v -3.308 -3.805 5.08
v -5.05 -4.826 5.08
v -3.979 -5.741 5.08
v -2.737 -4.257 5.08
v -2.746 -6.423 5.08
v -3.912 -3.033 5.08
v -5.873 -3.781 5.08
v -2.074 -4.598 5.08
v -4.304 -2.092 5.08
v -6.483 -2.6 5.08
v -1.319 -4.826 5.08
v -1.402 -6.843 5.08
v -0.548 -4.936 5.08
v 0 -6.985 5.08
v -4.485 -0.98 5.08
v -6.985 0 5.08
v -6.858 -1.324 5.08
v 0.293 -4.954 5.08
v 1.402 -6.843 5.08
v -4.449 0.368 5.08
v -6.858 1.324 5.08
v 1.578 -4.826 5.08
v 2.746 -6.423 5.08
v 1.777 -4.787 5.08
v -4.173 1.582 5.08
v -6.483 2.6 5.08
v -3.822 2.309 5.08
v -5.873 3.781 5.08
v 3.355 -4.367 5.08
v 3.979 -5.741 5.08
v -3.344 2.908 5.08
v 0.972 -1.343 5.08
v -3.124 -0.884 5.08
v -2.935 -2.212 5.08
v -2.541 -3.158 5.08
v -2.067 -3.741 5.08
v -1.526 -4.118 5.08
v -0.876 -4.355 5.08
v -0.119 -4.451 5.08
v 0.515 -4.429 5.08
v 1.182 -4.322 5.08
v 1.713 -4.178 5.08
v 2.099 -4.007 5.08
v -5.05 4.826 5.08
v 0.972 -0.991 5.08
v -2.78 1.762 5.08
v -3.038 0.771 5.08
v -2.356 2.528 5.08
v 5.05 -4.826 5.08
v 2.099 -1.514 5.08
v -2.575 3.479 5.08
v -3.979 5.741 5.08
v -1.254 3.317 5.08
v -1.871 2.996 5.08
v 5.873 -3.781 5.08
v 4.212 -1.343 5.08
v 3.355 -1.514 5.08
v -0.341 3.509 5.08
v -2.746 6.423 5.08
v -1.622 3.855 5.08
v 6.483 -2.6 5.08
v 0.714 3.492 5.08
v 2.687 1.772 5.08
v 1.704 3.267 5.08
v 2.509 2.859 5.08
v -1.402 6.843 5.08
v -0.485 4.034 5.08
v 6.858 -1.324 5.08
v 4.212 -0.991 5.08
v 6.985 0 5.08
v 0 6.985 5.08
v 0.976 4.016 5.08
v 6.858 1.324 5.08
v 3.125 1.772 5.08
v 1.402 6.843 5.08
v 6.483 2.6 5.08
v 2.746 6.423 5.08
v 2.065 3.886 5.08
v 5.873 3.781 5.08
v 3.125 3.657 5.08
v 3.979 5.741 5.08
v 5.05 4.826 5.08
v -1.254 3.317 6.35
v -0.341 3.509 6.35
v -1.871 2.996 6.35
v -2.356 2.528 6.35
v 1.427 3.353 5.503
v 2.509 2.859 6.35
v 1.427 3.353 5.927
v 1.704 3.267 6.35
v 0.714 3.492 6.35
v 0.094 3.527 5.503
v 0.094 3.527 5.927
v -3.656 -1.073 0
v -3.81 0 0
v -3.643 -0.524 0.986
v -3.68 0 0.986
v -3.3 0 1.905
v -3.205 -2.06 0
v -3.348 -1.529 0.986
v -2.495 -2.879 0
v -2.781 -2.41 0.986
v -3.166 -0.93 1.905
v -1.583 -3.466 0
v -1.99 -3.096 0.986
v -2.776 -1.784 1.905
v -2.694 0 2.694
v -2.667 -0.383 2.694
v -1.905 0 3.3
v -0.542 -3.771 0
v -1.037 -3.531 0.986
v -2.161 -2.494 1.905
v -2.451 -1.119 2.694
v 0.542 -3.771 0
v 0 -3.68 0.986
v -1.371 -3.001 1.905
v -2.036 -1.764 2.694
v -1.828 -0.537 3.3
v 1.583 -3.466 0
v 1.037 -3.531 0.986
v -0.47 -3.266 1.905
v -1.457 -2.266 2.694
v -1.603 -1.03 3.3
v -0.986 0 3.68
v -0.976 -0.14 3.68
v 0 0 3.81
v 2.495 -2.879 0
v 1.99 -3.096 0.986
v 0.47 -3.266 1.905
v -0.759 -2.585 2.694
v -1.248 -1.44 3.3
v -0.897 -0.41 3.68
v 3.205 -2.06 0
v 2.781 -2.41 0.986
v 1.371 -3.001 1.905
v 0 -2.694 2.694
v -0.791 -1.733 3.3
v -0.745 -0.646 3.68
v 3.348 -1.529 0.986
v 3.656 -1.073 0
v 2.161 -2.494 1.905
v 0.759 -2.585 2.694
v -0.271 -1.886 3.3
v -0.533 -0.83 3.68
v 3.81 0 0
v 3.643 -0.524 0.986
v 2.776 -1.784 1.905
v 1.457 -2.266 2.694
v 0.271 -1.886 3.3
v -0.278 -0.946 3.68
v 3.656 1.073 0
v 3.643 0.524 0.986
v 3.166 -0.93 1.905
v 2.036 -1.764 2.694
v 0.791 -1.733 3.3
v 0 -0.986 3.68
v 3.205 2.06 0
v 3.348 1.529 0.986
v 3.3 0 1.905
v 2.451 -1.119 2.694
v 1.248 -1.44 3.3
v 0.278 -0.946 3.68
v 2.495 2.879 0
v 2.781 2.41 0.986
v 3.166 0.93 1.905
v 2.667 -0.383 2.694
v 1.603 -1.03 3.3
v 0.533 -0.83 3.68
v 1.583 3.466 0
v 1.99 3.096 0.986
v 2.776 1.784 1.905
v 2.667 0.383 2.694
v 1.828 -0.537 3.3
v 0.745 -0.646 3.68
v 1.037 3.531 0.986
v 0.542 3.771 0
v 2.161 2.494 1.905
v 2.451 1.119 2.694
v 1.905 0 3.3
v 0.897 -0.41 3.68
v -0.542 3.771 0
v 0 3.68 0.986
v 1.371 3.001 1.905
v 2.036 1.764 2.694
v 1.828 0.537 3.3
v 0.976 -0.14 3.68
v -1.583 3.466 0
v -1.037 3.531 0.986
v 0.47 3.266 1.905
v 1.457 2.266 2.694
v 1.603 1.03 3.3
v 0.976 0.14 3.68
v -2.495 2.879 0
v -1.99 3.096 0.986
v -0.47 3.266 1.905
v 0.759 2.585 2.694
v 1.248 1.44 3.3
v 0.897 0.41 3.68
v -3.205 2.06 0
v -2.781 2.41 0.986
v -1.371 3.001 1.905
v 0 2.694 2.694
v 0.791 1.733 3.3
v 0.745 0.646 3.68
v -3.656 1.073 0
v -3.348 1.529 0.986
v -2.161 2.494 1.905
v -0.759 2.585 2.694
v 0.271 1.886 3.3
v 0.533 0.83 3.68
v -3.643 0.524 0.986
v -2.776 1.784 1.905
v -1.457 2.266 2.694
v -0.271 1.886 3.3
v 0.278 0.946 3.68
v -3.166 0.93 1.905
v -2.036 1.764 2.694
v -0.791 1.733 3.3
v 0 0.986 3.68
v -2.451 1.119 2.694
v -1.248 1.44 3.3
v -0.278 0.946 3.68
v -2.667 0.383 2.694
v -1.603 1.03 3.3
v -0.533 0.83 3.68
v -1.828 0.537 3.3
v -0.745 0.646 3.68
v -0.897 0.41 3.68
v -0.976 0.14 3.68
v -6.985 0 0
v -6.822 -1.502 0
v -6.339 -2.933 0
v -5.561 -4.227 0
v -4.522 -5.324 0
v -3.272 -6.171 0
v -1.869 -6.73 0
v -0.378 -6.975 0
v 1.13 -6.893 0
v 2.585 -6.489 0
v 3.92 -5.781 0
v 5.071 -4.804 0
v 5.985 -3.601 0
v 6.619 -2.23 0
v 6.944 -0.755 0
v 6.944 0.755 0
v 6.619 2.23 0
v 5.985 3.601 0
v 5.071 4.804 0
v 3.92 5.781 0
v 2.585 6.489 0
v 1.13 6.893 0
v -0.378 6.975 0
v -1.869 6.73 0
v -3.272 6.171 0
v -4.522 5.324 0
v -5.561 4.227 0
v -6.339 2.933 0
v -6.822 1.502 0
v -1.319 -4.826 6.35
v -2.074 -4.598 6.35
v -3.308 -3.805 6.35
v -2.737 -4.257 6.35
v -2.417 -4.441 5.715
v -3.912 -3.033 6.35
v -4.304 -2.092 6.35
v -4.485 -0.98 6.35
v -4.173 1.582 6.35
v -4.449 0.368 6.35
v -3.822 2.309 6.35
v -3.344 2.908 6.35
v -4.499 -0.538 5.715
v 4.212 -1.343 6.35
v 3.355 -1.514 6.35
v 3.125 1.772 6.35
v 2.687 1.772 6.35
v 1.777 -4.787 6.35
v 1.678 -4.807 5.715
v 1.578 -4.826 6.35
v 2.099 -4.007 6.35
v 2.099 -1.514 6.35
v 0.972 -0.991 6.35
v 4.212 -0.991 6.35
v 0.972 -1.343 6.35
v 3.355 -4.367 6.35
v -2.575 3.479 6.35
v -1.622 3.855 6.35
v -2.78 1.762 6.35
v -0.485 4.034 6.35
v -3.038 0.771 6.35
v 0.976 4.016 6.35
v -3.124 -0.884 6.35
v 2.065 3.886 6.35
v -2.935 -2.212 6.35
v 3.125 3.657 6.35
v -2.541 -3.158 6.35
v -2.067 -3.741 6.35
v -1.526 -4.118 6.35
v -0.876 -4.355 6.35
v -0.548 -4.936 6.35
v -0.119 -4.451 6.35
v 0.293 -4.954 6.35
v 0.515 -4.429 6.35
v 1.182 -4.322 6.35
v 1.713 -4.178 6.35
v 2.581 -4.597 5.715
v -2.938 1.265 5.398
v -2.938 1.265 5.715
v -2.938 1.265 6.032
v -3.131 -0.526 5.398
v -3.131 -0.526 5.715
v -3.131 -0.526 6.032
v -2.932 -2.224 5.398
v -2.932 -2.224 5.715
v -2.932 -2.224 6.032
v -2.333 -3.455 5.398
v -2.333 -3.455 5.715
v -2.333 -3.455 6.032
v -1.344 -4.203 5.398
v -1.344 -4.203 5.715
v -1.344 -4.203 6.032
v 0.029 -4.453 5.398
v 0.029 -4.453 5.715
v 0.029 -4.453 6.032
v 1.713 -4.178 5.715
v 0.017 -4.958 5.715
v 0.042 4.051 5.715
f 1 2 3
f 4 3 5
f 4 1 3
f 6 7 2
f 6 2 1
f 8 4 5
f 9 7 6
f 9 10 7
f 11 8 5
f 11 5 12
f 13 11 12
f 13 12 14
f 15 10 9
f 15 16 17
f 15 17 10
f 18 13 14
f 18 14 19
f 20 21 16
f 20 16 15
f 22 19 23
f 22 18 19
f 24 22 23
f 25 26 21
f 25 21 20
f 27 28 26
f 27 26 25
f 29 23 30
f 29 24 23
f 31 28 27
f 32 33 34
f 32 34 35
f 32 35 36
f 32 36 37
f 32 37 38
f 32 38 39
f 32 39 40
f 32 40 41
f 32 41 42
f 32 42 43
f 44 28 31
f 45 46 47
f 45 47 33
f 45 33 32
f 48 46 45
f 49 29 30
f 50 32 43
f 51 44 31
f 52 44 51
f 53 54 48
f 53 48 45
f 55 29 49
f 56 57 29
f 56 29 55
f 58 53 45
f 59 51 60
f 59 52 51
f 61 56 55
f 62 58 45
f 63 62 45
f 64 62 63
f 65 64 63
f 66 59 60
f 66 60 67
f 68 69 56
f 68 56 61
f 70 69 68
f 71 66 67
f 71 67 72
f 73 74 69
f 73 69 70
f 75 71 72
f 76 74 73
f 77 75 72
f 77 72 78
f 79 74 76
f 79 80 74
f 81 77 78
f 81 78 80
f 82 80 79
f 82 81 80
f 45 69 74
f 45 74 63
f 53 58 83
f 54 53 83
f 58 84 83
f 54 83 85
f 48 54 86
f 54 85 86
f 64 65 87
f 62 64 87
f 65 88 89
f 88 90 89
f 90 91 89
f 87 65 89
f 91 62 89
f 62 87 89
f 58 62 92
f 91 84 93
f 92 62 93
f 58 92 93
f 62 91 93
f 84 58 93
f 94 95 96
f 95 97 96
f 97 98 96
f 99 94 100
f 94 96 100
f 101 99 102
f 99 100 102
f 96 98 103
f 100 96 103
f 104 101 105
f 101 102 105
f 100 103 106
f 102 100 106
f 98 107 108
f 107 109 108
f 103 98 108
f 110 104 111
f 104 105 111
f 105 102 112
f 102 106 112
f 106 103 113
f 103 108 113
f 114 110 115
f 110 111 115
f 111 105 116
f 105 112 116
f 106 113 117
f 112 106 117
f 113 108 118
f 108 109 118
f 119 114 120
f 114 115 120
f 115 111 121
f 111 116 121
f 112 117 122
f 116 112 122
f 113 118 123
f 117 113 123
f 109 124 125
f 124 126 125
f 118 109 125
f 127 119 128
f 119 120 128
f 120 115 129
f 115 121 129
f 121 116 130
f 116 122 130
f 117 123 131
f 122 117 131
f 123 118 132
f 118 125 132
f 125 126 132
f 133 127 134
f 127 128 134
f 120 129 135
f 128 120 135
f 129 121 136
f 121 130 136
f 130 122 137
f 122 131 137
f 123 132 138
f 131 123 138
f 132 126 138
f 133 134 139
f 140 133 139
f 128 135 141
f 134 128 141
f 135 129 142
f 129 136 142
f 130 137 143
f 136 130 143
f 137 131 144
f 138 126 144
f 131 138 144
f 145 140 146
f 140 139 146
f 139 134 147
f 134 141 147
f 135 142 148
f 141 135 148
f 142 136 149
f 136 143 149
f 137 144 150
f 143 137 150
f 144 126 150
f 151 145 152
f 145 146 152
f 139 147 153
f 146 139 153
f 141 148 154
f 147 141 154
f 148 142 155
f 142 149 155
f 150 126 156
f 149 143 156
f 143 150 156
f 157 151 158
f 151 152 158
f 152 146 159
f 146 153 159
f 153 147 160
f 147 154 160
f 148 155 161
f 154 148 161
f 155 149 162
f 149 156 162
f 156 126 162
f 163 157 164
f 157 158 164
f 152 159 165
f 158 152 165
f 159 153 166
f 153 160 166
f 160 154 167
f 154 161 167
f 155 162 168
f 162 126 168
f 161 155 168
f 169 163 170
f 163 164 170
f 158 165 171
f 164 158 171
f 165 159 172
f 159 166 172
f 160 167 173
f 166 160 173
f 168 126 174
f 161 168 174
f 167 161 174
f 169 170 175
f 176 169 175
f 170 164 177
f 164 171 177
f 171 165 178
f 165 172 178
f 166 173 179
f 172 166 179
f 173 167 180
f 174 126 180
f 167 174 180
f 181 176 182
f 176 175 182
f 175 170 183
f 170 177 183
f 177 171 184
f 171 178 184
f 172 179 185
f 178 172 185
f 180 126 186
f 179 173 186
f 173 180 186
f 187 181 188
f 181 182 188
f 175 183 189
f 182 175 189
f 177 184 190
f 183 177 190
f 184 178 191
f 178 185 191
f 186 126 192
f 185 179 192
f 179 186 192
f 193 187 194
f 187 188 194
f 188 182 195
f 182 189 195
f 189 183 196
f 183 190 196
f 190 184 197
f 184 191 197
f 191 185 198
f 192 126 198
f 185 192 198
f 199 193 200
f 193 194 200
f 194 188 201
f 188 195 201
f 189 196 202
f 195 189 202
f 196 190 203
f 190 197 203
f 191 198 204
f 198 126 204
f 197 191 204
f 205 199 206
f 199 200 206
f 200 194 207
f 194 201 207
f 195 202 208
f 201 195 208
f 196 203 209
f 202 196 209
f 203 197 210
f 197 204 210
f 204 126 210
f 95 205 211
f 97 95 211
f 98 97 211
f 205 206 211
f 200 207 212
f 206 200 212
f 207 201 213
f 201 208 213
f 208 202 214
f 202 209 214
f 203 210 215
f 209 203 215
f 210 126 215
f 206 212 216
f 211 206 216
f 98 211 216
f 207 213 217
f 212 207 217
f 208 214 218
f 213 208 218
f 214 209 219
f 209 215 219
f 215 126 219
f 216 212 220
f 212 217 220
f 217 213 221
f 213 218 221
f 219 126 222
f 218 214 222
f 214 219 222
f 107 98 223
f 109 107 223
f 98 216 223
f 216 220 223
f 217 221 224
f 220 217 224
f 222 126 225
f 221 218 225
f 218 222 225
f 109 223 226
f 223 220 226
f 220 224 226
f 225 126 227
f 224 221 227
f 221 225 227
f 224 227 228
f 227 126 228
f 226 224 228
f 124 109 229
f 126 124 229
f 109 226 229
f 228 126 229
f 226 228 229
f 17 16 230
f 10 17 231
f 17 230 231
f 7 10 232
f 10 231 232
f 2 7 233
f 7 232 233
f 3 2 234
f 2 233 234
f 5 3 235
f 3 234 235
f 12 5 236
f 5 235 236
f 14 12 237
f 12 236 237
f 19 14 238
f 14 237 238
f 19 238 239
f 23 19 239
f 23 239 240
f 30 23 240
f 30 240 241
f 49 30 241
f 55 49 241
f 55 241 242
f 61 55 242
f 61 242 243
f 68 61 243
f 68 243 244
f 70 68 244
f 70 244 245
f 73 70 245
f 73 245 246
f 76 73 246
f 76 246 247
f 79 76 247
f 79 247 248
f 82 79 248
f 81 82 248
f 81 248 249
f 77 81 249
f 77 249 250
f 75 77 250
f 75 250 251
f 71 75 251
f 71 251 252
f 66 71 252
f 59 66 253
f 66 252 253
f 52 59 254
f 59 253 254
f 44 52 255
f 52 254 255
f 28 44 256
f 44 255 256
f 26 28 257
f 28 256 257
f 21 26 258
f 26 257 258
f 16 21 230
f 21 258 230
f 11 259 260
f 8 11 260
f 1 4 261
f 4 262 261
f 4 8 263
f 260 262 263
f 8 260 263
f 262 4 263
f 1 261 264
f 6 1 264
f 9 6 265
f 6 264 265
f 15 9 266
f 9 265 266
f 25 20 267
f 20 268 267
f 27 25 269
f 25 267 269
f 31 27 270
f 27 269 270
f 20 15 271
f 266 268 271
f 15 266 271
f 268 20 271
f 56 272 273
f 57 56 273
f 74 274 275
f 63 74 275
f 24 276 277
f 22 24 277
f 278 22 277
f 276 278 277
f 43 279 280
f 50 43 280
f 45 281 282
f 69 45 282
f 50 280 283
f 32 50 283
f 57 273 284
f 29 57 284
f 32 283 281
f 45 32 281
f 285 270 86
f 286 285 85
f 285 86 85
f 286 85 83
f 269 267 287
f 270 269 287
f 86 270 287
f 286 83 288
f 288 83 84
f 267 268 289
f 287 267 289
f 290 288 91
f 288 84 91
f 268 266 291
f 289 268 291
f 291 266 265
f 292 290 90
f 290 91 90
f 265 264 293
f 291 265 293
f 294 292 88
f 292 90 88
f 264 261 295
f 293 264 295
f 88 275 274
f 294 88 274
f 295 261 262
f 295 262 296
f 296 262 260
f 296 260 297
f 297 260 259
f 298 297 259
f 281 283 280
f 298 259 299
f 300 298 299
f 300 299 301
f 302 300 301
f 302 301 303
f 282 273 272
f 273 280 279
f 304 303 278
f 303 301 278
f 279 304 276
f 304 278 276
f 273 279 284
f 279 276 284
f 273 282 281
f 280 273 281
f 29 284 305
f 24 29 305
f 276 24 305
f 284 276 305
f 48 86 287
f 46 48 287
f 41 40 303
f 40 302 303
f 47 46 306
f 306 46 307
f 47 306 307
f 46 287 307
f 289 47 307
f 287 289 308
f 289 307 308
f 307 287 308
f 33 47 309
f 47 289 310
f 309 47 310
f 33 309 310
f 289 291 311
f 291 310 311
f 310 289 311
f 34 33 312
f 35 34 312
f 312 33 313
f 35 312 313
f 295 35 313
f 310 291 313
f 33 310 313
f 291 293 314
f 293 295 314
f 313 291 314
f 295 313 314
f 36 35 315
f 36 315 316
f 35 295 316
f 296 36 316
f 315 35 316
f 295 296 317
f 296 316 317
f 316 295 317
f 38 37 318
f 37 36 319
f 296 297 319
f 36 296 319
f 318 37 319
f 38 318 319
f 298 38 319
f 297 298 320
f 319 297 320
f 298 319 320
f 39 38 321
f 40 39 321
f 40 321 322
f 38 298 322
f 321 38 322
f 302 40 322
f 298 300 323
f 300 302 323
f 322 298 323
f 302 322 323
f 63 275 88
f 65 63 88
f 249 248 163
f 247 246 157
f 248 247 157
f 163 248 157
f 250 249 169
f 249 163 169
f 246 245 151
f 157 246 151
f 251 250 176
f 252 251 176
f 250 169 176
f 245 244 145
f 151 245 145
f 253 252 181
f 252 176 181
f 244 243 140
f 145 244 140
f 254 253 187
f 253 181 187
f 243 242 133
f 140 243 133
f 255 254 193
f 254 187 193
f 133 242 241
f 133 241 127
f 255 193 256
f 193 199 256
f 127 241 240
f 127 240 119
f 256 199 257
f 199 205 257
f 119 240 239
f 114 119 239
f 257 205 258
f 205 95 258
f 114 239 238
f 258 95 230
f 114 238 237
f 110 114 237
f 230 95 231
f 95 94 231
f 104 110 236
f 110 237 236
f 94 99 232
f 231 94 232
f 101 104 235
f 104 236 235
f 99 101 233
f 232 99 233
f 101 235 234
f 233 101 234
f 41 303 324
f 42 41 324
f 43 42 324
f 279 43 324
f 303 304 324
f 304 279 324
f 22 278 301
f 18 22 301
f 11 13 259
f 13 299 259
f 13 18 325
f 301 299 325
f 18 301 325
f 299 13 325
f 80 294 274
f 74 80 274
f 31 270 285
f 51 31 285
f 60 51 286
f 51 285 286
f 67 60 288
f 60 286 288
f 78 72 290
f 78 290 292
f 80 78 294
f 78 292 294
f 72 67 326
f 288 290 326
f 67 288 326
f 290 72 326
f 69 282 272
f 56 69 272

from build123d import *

# Parameters (mm, degrees)
F3_DEPTH = 1.27


with BuildPart() as f1:
    # F0 (on Front) → F1 (revolve)
    with BuildSketch(Plane.XZ):
        with BuildLine():
            Line((-6.985, 6.35), (-6.985, 0))
            Line((-6.985, 0), (-3.81, 0))
            ThreePointArc((-3.81, 0), (-2.6940768363, 2.6940768363), (0, 3.81))
            Line((0, 3.81), (0, 6.35))
            Line((0, 6.35), (-6.985, 6.35))
        make_face()
    revolve(axis=Axis((0, 0, 5.08), (0, 0, 1)))

    # F2 (on face) → F3 (cut)
    with BuildSketch(Plane.XY.offset(6.35)):
        with BuildLine():
            Line((-5.0499272347, 4.825811841), (5.0499272347, 4.825811841))
            ThreePointArc((5.0499272347, 4.825811841), (0, 6.985), (-5.0499272347, 4.825811841))
        make_face()
        with BuildLine():
            Line((5.0499272347, -4.825811841), (5.0499272347, 4.825811841))
            Line((5.0499272347, 4.825811841), (-5.0499272347, 4.825811841))
            Line((-5.0499272347, 4.825811841), (-5.0499272347, -4.825811841))
            Line((-5.0499272347, -4.825811841), (-1.3193129815, -4.825811841))
            add(Edge.make_bspline(
                [(-1.3193129815, -4.825811841), (-2.5203953314, -4.5677027566), (-3.3083202269, -3.8047253512)],
                knots=[0.3382919108, 0.3382919108, 0.3382919108, 1, 1, 1], degree=2))
            add(Edge.make_bspline(
                [(-3.3083202269, -3.8047253512), (-4.4990641643, -2.6516830689), (-4.4990641643, -0.5382958521)],
                knots=[0, 0, 0, 1, 1, 1], degree=2))
            add(Edge.make_bspline(
                [(-4.4990641643, -0.5382958521), (-4.4990641643, 1.7656941762), (-3.3439273456, 2.9082637766)],
                knots=[0, 0, 0, 1, 1, 1], degree=2))
            add(Edge.make_bspline(
                [(-3.3439273456, 2.9082637766), (-2.1887905268, 4.0508333769), (0.0418907278, 4.0508333769)],
                knots=[0, 0, 0, 1, 1, 1], degree=2))
            add(Edge.make_bspline(
                [(0.0418907278, 4.0508333769), (1.6400219928, 4.0508333769), (3.1250482929, 3.6570605358)],
                knots=[0, 0, 0, 1, 1, 1], degree=2))
            Line((3.1250482929, 3.6570605358), (3.1250482929, 1.7719777854))
            Line((3.1250482929, 1.7719777854), (2.6872901875, 1.7719777854))
            Line((2.6872901875, 1.7719777854), (2.5092545944, 2.8590421714))
            add(Edge.make_bspline(
                [(2.5092545944, 2.8590421714), (2.0589292707, 3.179506239), (1.4274265493, 3.3533527593)],
                knots=[0, 0, 0, 1, 1, 1], degree=2))
            add(Edge.make_bspline(
                [(1.4274265493, 3.3533527593), (0.7959238279, 3.5271992796), (0.0942541375, 3.5271992796)],
                knots=[0, 0, 0, 1, 1, 1], degree=2))
            add(Edge.make_bspline(
                [(0.0942541375, 3.5271992796), (-1.5813749739, 3.5271992796), (-2.356353438, 2.5281054219)],
                knots=[0, 0, 0, 1, 1, 1], degree=2))
            add(Edge.make_bspline(
                [(-2.356353438, 2.5281054219), (-3.131331902, 1.5290115642), (-3.131331902, -0.5257286337)],
                knots=[0, 0, 0, 1, 1, 1], degree=2))
            add(Edge.make_bspline(
                [(-3.131331902, -0.5257286337), (-3.131331902, -2.4568911847), (-2.3333135377, -3.4549377742)],
                knots=[0, 0, 0, 1, 1, 1], degree=2))
            add(Edge.make_bspline(
                [(-2.3333135377, -3.4549377742), (-1.5352951734, -4.4529843637), (0.0293235095, -4.4529843637)],
                knots=[0, 0, 0, 1, 1, 1], degree=2))
            add(Edge.make_bspline(
                [(0.0293235095, -4.4529843637), (0.5801865798, -4.4529843637), (1.1823657918, -4.3220758394)],
                knots=[0, 0, 0, 1, 1, 1], degree=2))
            add(Edge.make_bspline(
                [(1.1823657918, -4.3220758394), (1.7845450037, -4.191167315), (2.0987254621, -4.0068481128)],
                knots=[0, 0, 0, 1, 1, 1], degree=2))
            Line((2.0987254621, -4.0068481128), (2.0987254621, -1.5143498095))
            Line((2.0987254621, -1.5143498095), (0.9718648846, -1.3425978256))
            Line((0.9718648846, -1.3425978256), (0.9718648846, -0.9907157121))
            Line((0.9718648846, -0.9907157121), (4.2121126789, -0.9907157121))
            Line((4.2121126789, -0.9907157121), (4.2121126789, -1.3425978256))
            Line((4.2121126789, -1.3425978256), (3.3554472957, -1.5143498095))
            Line((3.3554472957, -1.5143498095), (3.3554472957, -4.3671083717))
            add(Edge.make_bspline(
                [(3.3554472957, -4.3671083717), (2.5951305864, -4.6163582021), (1.7772141263, -4.7870629178)],
                knots=[0, 0, 0, 1, 1, 1], degree=2))
            add(Edge.make_bspline(
                [(1.7772141263, -4.7870629178), (1.6784160951, -4.8076827374), (1.5777996884, -4.825811841)],
                knots=[0, 0, 0, 0.1207923255, 0.1207923255, 0.1207923255], degree=2))
            Line((1.5777996884, -4.825811841), (5.0499272347, -4.825811841))
        make_face()
        with BuildLine():
            Line((-5.0499272347, -4.825811841), (-5.0499272347, 4.825811841))
            ThreePointArc((-5.0499272347, 4.825811841), (-6.985, 0), (-5.0499272347, -4.825811841))
        make_face()
        with BuildLine():
            ThreePointArc((-5.0499272347, -4.825811841), (0, -6.985), (5.0499272347, -4.825811841))
            Line((5.0499272347, -4.825811841), (1.5777996884, -4.825811841))
            add(Edge.make_bspline(
                [(1.5777996884, -4.825811841), (0.8454459018, -4.9577676335), (0.0167562911, -4.9577676335)],
                knots=[0.1207923255, 0.1207923255, 0.1207923255, 1, 1, 1], degree=2))
            add(Edge.make_bspline(
                [(0.0167562911, -4.9577676335), (-0.7052711558, -4.9577676335), (-1.3193129815, -4.825811841)],
                knots=[0, 0, 0, 0.3382919108, 0.3382919108, 0.3382919108], degree=2))
            Line((-1.3193129815, -4.825811841), (-5.0499272347, -4.825811841))
        make_face()
        with BuildLine():
            ThreePointArc((6.985, 0), (6.4832077992, 2.5996618305), (5.0499272347, 4.825811841))
            Line((5.0499272347, 4.825811841), (5.0499272347, -4.825811841))
            ThreePointArc((5.0499272347, -4.825811841), (6.4832077992, -2.5996618305), (6.985, 0))
        make_face()
    extrude(amount=-F3_DEPTH, mode=Mode.SUBTRACT)


solid = f1.part
